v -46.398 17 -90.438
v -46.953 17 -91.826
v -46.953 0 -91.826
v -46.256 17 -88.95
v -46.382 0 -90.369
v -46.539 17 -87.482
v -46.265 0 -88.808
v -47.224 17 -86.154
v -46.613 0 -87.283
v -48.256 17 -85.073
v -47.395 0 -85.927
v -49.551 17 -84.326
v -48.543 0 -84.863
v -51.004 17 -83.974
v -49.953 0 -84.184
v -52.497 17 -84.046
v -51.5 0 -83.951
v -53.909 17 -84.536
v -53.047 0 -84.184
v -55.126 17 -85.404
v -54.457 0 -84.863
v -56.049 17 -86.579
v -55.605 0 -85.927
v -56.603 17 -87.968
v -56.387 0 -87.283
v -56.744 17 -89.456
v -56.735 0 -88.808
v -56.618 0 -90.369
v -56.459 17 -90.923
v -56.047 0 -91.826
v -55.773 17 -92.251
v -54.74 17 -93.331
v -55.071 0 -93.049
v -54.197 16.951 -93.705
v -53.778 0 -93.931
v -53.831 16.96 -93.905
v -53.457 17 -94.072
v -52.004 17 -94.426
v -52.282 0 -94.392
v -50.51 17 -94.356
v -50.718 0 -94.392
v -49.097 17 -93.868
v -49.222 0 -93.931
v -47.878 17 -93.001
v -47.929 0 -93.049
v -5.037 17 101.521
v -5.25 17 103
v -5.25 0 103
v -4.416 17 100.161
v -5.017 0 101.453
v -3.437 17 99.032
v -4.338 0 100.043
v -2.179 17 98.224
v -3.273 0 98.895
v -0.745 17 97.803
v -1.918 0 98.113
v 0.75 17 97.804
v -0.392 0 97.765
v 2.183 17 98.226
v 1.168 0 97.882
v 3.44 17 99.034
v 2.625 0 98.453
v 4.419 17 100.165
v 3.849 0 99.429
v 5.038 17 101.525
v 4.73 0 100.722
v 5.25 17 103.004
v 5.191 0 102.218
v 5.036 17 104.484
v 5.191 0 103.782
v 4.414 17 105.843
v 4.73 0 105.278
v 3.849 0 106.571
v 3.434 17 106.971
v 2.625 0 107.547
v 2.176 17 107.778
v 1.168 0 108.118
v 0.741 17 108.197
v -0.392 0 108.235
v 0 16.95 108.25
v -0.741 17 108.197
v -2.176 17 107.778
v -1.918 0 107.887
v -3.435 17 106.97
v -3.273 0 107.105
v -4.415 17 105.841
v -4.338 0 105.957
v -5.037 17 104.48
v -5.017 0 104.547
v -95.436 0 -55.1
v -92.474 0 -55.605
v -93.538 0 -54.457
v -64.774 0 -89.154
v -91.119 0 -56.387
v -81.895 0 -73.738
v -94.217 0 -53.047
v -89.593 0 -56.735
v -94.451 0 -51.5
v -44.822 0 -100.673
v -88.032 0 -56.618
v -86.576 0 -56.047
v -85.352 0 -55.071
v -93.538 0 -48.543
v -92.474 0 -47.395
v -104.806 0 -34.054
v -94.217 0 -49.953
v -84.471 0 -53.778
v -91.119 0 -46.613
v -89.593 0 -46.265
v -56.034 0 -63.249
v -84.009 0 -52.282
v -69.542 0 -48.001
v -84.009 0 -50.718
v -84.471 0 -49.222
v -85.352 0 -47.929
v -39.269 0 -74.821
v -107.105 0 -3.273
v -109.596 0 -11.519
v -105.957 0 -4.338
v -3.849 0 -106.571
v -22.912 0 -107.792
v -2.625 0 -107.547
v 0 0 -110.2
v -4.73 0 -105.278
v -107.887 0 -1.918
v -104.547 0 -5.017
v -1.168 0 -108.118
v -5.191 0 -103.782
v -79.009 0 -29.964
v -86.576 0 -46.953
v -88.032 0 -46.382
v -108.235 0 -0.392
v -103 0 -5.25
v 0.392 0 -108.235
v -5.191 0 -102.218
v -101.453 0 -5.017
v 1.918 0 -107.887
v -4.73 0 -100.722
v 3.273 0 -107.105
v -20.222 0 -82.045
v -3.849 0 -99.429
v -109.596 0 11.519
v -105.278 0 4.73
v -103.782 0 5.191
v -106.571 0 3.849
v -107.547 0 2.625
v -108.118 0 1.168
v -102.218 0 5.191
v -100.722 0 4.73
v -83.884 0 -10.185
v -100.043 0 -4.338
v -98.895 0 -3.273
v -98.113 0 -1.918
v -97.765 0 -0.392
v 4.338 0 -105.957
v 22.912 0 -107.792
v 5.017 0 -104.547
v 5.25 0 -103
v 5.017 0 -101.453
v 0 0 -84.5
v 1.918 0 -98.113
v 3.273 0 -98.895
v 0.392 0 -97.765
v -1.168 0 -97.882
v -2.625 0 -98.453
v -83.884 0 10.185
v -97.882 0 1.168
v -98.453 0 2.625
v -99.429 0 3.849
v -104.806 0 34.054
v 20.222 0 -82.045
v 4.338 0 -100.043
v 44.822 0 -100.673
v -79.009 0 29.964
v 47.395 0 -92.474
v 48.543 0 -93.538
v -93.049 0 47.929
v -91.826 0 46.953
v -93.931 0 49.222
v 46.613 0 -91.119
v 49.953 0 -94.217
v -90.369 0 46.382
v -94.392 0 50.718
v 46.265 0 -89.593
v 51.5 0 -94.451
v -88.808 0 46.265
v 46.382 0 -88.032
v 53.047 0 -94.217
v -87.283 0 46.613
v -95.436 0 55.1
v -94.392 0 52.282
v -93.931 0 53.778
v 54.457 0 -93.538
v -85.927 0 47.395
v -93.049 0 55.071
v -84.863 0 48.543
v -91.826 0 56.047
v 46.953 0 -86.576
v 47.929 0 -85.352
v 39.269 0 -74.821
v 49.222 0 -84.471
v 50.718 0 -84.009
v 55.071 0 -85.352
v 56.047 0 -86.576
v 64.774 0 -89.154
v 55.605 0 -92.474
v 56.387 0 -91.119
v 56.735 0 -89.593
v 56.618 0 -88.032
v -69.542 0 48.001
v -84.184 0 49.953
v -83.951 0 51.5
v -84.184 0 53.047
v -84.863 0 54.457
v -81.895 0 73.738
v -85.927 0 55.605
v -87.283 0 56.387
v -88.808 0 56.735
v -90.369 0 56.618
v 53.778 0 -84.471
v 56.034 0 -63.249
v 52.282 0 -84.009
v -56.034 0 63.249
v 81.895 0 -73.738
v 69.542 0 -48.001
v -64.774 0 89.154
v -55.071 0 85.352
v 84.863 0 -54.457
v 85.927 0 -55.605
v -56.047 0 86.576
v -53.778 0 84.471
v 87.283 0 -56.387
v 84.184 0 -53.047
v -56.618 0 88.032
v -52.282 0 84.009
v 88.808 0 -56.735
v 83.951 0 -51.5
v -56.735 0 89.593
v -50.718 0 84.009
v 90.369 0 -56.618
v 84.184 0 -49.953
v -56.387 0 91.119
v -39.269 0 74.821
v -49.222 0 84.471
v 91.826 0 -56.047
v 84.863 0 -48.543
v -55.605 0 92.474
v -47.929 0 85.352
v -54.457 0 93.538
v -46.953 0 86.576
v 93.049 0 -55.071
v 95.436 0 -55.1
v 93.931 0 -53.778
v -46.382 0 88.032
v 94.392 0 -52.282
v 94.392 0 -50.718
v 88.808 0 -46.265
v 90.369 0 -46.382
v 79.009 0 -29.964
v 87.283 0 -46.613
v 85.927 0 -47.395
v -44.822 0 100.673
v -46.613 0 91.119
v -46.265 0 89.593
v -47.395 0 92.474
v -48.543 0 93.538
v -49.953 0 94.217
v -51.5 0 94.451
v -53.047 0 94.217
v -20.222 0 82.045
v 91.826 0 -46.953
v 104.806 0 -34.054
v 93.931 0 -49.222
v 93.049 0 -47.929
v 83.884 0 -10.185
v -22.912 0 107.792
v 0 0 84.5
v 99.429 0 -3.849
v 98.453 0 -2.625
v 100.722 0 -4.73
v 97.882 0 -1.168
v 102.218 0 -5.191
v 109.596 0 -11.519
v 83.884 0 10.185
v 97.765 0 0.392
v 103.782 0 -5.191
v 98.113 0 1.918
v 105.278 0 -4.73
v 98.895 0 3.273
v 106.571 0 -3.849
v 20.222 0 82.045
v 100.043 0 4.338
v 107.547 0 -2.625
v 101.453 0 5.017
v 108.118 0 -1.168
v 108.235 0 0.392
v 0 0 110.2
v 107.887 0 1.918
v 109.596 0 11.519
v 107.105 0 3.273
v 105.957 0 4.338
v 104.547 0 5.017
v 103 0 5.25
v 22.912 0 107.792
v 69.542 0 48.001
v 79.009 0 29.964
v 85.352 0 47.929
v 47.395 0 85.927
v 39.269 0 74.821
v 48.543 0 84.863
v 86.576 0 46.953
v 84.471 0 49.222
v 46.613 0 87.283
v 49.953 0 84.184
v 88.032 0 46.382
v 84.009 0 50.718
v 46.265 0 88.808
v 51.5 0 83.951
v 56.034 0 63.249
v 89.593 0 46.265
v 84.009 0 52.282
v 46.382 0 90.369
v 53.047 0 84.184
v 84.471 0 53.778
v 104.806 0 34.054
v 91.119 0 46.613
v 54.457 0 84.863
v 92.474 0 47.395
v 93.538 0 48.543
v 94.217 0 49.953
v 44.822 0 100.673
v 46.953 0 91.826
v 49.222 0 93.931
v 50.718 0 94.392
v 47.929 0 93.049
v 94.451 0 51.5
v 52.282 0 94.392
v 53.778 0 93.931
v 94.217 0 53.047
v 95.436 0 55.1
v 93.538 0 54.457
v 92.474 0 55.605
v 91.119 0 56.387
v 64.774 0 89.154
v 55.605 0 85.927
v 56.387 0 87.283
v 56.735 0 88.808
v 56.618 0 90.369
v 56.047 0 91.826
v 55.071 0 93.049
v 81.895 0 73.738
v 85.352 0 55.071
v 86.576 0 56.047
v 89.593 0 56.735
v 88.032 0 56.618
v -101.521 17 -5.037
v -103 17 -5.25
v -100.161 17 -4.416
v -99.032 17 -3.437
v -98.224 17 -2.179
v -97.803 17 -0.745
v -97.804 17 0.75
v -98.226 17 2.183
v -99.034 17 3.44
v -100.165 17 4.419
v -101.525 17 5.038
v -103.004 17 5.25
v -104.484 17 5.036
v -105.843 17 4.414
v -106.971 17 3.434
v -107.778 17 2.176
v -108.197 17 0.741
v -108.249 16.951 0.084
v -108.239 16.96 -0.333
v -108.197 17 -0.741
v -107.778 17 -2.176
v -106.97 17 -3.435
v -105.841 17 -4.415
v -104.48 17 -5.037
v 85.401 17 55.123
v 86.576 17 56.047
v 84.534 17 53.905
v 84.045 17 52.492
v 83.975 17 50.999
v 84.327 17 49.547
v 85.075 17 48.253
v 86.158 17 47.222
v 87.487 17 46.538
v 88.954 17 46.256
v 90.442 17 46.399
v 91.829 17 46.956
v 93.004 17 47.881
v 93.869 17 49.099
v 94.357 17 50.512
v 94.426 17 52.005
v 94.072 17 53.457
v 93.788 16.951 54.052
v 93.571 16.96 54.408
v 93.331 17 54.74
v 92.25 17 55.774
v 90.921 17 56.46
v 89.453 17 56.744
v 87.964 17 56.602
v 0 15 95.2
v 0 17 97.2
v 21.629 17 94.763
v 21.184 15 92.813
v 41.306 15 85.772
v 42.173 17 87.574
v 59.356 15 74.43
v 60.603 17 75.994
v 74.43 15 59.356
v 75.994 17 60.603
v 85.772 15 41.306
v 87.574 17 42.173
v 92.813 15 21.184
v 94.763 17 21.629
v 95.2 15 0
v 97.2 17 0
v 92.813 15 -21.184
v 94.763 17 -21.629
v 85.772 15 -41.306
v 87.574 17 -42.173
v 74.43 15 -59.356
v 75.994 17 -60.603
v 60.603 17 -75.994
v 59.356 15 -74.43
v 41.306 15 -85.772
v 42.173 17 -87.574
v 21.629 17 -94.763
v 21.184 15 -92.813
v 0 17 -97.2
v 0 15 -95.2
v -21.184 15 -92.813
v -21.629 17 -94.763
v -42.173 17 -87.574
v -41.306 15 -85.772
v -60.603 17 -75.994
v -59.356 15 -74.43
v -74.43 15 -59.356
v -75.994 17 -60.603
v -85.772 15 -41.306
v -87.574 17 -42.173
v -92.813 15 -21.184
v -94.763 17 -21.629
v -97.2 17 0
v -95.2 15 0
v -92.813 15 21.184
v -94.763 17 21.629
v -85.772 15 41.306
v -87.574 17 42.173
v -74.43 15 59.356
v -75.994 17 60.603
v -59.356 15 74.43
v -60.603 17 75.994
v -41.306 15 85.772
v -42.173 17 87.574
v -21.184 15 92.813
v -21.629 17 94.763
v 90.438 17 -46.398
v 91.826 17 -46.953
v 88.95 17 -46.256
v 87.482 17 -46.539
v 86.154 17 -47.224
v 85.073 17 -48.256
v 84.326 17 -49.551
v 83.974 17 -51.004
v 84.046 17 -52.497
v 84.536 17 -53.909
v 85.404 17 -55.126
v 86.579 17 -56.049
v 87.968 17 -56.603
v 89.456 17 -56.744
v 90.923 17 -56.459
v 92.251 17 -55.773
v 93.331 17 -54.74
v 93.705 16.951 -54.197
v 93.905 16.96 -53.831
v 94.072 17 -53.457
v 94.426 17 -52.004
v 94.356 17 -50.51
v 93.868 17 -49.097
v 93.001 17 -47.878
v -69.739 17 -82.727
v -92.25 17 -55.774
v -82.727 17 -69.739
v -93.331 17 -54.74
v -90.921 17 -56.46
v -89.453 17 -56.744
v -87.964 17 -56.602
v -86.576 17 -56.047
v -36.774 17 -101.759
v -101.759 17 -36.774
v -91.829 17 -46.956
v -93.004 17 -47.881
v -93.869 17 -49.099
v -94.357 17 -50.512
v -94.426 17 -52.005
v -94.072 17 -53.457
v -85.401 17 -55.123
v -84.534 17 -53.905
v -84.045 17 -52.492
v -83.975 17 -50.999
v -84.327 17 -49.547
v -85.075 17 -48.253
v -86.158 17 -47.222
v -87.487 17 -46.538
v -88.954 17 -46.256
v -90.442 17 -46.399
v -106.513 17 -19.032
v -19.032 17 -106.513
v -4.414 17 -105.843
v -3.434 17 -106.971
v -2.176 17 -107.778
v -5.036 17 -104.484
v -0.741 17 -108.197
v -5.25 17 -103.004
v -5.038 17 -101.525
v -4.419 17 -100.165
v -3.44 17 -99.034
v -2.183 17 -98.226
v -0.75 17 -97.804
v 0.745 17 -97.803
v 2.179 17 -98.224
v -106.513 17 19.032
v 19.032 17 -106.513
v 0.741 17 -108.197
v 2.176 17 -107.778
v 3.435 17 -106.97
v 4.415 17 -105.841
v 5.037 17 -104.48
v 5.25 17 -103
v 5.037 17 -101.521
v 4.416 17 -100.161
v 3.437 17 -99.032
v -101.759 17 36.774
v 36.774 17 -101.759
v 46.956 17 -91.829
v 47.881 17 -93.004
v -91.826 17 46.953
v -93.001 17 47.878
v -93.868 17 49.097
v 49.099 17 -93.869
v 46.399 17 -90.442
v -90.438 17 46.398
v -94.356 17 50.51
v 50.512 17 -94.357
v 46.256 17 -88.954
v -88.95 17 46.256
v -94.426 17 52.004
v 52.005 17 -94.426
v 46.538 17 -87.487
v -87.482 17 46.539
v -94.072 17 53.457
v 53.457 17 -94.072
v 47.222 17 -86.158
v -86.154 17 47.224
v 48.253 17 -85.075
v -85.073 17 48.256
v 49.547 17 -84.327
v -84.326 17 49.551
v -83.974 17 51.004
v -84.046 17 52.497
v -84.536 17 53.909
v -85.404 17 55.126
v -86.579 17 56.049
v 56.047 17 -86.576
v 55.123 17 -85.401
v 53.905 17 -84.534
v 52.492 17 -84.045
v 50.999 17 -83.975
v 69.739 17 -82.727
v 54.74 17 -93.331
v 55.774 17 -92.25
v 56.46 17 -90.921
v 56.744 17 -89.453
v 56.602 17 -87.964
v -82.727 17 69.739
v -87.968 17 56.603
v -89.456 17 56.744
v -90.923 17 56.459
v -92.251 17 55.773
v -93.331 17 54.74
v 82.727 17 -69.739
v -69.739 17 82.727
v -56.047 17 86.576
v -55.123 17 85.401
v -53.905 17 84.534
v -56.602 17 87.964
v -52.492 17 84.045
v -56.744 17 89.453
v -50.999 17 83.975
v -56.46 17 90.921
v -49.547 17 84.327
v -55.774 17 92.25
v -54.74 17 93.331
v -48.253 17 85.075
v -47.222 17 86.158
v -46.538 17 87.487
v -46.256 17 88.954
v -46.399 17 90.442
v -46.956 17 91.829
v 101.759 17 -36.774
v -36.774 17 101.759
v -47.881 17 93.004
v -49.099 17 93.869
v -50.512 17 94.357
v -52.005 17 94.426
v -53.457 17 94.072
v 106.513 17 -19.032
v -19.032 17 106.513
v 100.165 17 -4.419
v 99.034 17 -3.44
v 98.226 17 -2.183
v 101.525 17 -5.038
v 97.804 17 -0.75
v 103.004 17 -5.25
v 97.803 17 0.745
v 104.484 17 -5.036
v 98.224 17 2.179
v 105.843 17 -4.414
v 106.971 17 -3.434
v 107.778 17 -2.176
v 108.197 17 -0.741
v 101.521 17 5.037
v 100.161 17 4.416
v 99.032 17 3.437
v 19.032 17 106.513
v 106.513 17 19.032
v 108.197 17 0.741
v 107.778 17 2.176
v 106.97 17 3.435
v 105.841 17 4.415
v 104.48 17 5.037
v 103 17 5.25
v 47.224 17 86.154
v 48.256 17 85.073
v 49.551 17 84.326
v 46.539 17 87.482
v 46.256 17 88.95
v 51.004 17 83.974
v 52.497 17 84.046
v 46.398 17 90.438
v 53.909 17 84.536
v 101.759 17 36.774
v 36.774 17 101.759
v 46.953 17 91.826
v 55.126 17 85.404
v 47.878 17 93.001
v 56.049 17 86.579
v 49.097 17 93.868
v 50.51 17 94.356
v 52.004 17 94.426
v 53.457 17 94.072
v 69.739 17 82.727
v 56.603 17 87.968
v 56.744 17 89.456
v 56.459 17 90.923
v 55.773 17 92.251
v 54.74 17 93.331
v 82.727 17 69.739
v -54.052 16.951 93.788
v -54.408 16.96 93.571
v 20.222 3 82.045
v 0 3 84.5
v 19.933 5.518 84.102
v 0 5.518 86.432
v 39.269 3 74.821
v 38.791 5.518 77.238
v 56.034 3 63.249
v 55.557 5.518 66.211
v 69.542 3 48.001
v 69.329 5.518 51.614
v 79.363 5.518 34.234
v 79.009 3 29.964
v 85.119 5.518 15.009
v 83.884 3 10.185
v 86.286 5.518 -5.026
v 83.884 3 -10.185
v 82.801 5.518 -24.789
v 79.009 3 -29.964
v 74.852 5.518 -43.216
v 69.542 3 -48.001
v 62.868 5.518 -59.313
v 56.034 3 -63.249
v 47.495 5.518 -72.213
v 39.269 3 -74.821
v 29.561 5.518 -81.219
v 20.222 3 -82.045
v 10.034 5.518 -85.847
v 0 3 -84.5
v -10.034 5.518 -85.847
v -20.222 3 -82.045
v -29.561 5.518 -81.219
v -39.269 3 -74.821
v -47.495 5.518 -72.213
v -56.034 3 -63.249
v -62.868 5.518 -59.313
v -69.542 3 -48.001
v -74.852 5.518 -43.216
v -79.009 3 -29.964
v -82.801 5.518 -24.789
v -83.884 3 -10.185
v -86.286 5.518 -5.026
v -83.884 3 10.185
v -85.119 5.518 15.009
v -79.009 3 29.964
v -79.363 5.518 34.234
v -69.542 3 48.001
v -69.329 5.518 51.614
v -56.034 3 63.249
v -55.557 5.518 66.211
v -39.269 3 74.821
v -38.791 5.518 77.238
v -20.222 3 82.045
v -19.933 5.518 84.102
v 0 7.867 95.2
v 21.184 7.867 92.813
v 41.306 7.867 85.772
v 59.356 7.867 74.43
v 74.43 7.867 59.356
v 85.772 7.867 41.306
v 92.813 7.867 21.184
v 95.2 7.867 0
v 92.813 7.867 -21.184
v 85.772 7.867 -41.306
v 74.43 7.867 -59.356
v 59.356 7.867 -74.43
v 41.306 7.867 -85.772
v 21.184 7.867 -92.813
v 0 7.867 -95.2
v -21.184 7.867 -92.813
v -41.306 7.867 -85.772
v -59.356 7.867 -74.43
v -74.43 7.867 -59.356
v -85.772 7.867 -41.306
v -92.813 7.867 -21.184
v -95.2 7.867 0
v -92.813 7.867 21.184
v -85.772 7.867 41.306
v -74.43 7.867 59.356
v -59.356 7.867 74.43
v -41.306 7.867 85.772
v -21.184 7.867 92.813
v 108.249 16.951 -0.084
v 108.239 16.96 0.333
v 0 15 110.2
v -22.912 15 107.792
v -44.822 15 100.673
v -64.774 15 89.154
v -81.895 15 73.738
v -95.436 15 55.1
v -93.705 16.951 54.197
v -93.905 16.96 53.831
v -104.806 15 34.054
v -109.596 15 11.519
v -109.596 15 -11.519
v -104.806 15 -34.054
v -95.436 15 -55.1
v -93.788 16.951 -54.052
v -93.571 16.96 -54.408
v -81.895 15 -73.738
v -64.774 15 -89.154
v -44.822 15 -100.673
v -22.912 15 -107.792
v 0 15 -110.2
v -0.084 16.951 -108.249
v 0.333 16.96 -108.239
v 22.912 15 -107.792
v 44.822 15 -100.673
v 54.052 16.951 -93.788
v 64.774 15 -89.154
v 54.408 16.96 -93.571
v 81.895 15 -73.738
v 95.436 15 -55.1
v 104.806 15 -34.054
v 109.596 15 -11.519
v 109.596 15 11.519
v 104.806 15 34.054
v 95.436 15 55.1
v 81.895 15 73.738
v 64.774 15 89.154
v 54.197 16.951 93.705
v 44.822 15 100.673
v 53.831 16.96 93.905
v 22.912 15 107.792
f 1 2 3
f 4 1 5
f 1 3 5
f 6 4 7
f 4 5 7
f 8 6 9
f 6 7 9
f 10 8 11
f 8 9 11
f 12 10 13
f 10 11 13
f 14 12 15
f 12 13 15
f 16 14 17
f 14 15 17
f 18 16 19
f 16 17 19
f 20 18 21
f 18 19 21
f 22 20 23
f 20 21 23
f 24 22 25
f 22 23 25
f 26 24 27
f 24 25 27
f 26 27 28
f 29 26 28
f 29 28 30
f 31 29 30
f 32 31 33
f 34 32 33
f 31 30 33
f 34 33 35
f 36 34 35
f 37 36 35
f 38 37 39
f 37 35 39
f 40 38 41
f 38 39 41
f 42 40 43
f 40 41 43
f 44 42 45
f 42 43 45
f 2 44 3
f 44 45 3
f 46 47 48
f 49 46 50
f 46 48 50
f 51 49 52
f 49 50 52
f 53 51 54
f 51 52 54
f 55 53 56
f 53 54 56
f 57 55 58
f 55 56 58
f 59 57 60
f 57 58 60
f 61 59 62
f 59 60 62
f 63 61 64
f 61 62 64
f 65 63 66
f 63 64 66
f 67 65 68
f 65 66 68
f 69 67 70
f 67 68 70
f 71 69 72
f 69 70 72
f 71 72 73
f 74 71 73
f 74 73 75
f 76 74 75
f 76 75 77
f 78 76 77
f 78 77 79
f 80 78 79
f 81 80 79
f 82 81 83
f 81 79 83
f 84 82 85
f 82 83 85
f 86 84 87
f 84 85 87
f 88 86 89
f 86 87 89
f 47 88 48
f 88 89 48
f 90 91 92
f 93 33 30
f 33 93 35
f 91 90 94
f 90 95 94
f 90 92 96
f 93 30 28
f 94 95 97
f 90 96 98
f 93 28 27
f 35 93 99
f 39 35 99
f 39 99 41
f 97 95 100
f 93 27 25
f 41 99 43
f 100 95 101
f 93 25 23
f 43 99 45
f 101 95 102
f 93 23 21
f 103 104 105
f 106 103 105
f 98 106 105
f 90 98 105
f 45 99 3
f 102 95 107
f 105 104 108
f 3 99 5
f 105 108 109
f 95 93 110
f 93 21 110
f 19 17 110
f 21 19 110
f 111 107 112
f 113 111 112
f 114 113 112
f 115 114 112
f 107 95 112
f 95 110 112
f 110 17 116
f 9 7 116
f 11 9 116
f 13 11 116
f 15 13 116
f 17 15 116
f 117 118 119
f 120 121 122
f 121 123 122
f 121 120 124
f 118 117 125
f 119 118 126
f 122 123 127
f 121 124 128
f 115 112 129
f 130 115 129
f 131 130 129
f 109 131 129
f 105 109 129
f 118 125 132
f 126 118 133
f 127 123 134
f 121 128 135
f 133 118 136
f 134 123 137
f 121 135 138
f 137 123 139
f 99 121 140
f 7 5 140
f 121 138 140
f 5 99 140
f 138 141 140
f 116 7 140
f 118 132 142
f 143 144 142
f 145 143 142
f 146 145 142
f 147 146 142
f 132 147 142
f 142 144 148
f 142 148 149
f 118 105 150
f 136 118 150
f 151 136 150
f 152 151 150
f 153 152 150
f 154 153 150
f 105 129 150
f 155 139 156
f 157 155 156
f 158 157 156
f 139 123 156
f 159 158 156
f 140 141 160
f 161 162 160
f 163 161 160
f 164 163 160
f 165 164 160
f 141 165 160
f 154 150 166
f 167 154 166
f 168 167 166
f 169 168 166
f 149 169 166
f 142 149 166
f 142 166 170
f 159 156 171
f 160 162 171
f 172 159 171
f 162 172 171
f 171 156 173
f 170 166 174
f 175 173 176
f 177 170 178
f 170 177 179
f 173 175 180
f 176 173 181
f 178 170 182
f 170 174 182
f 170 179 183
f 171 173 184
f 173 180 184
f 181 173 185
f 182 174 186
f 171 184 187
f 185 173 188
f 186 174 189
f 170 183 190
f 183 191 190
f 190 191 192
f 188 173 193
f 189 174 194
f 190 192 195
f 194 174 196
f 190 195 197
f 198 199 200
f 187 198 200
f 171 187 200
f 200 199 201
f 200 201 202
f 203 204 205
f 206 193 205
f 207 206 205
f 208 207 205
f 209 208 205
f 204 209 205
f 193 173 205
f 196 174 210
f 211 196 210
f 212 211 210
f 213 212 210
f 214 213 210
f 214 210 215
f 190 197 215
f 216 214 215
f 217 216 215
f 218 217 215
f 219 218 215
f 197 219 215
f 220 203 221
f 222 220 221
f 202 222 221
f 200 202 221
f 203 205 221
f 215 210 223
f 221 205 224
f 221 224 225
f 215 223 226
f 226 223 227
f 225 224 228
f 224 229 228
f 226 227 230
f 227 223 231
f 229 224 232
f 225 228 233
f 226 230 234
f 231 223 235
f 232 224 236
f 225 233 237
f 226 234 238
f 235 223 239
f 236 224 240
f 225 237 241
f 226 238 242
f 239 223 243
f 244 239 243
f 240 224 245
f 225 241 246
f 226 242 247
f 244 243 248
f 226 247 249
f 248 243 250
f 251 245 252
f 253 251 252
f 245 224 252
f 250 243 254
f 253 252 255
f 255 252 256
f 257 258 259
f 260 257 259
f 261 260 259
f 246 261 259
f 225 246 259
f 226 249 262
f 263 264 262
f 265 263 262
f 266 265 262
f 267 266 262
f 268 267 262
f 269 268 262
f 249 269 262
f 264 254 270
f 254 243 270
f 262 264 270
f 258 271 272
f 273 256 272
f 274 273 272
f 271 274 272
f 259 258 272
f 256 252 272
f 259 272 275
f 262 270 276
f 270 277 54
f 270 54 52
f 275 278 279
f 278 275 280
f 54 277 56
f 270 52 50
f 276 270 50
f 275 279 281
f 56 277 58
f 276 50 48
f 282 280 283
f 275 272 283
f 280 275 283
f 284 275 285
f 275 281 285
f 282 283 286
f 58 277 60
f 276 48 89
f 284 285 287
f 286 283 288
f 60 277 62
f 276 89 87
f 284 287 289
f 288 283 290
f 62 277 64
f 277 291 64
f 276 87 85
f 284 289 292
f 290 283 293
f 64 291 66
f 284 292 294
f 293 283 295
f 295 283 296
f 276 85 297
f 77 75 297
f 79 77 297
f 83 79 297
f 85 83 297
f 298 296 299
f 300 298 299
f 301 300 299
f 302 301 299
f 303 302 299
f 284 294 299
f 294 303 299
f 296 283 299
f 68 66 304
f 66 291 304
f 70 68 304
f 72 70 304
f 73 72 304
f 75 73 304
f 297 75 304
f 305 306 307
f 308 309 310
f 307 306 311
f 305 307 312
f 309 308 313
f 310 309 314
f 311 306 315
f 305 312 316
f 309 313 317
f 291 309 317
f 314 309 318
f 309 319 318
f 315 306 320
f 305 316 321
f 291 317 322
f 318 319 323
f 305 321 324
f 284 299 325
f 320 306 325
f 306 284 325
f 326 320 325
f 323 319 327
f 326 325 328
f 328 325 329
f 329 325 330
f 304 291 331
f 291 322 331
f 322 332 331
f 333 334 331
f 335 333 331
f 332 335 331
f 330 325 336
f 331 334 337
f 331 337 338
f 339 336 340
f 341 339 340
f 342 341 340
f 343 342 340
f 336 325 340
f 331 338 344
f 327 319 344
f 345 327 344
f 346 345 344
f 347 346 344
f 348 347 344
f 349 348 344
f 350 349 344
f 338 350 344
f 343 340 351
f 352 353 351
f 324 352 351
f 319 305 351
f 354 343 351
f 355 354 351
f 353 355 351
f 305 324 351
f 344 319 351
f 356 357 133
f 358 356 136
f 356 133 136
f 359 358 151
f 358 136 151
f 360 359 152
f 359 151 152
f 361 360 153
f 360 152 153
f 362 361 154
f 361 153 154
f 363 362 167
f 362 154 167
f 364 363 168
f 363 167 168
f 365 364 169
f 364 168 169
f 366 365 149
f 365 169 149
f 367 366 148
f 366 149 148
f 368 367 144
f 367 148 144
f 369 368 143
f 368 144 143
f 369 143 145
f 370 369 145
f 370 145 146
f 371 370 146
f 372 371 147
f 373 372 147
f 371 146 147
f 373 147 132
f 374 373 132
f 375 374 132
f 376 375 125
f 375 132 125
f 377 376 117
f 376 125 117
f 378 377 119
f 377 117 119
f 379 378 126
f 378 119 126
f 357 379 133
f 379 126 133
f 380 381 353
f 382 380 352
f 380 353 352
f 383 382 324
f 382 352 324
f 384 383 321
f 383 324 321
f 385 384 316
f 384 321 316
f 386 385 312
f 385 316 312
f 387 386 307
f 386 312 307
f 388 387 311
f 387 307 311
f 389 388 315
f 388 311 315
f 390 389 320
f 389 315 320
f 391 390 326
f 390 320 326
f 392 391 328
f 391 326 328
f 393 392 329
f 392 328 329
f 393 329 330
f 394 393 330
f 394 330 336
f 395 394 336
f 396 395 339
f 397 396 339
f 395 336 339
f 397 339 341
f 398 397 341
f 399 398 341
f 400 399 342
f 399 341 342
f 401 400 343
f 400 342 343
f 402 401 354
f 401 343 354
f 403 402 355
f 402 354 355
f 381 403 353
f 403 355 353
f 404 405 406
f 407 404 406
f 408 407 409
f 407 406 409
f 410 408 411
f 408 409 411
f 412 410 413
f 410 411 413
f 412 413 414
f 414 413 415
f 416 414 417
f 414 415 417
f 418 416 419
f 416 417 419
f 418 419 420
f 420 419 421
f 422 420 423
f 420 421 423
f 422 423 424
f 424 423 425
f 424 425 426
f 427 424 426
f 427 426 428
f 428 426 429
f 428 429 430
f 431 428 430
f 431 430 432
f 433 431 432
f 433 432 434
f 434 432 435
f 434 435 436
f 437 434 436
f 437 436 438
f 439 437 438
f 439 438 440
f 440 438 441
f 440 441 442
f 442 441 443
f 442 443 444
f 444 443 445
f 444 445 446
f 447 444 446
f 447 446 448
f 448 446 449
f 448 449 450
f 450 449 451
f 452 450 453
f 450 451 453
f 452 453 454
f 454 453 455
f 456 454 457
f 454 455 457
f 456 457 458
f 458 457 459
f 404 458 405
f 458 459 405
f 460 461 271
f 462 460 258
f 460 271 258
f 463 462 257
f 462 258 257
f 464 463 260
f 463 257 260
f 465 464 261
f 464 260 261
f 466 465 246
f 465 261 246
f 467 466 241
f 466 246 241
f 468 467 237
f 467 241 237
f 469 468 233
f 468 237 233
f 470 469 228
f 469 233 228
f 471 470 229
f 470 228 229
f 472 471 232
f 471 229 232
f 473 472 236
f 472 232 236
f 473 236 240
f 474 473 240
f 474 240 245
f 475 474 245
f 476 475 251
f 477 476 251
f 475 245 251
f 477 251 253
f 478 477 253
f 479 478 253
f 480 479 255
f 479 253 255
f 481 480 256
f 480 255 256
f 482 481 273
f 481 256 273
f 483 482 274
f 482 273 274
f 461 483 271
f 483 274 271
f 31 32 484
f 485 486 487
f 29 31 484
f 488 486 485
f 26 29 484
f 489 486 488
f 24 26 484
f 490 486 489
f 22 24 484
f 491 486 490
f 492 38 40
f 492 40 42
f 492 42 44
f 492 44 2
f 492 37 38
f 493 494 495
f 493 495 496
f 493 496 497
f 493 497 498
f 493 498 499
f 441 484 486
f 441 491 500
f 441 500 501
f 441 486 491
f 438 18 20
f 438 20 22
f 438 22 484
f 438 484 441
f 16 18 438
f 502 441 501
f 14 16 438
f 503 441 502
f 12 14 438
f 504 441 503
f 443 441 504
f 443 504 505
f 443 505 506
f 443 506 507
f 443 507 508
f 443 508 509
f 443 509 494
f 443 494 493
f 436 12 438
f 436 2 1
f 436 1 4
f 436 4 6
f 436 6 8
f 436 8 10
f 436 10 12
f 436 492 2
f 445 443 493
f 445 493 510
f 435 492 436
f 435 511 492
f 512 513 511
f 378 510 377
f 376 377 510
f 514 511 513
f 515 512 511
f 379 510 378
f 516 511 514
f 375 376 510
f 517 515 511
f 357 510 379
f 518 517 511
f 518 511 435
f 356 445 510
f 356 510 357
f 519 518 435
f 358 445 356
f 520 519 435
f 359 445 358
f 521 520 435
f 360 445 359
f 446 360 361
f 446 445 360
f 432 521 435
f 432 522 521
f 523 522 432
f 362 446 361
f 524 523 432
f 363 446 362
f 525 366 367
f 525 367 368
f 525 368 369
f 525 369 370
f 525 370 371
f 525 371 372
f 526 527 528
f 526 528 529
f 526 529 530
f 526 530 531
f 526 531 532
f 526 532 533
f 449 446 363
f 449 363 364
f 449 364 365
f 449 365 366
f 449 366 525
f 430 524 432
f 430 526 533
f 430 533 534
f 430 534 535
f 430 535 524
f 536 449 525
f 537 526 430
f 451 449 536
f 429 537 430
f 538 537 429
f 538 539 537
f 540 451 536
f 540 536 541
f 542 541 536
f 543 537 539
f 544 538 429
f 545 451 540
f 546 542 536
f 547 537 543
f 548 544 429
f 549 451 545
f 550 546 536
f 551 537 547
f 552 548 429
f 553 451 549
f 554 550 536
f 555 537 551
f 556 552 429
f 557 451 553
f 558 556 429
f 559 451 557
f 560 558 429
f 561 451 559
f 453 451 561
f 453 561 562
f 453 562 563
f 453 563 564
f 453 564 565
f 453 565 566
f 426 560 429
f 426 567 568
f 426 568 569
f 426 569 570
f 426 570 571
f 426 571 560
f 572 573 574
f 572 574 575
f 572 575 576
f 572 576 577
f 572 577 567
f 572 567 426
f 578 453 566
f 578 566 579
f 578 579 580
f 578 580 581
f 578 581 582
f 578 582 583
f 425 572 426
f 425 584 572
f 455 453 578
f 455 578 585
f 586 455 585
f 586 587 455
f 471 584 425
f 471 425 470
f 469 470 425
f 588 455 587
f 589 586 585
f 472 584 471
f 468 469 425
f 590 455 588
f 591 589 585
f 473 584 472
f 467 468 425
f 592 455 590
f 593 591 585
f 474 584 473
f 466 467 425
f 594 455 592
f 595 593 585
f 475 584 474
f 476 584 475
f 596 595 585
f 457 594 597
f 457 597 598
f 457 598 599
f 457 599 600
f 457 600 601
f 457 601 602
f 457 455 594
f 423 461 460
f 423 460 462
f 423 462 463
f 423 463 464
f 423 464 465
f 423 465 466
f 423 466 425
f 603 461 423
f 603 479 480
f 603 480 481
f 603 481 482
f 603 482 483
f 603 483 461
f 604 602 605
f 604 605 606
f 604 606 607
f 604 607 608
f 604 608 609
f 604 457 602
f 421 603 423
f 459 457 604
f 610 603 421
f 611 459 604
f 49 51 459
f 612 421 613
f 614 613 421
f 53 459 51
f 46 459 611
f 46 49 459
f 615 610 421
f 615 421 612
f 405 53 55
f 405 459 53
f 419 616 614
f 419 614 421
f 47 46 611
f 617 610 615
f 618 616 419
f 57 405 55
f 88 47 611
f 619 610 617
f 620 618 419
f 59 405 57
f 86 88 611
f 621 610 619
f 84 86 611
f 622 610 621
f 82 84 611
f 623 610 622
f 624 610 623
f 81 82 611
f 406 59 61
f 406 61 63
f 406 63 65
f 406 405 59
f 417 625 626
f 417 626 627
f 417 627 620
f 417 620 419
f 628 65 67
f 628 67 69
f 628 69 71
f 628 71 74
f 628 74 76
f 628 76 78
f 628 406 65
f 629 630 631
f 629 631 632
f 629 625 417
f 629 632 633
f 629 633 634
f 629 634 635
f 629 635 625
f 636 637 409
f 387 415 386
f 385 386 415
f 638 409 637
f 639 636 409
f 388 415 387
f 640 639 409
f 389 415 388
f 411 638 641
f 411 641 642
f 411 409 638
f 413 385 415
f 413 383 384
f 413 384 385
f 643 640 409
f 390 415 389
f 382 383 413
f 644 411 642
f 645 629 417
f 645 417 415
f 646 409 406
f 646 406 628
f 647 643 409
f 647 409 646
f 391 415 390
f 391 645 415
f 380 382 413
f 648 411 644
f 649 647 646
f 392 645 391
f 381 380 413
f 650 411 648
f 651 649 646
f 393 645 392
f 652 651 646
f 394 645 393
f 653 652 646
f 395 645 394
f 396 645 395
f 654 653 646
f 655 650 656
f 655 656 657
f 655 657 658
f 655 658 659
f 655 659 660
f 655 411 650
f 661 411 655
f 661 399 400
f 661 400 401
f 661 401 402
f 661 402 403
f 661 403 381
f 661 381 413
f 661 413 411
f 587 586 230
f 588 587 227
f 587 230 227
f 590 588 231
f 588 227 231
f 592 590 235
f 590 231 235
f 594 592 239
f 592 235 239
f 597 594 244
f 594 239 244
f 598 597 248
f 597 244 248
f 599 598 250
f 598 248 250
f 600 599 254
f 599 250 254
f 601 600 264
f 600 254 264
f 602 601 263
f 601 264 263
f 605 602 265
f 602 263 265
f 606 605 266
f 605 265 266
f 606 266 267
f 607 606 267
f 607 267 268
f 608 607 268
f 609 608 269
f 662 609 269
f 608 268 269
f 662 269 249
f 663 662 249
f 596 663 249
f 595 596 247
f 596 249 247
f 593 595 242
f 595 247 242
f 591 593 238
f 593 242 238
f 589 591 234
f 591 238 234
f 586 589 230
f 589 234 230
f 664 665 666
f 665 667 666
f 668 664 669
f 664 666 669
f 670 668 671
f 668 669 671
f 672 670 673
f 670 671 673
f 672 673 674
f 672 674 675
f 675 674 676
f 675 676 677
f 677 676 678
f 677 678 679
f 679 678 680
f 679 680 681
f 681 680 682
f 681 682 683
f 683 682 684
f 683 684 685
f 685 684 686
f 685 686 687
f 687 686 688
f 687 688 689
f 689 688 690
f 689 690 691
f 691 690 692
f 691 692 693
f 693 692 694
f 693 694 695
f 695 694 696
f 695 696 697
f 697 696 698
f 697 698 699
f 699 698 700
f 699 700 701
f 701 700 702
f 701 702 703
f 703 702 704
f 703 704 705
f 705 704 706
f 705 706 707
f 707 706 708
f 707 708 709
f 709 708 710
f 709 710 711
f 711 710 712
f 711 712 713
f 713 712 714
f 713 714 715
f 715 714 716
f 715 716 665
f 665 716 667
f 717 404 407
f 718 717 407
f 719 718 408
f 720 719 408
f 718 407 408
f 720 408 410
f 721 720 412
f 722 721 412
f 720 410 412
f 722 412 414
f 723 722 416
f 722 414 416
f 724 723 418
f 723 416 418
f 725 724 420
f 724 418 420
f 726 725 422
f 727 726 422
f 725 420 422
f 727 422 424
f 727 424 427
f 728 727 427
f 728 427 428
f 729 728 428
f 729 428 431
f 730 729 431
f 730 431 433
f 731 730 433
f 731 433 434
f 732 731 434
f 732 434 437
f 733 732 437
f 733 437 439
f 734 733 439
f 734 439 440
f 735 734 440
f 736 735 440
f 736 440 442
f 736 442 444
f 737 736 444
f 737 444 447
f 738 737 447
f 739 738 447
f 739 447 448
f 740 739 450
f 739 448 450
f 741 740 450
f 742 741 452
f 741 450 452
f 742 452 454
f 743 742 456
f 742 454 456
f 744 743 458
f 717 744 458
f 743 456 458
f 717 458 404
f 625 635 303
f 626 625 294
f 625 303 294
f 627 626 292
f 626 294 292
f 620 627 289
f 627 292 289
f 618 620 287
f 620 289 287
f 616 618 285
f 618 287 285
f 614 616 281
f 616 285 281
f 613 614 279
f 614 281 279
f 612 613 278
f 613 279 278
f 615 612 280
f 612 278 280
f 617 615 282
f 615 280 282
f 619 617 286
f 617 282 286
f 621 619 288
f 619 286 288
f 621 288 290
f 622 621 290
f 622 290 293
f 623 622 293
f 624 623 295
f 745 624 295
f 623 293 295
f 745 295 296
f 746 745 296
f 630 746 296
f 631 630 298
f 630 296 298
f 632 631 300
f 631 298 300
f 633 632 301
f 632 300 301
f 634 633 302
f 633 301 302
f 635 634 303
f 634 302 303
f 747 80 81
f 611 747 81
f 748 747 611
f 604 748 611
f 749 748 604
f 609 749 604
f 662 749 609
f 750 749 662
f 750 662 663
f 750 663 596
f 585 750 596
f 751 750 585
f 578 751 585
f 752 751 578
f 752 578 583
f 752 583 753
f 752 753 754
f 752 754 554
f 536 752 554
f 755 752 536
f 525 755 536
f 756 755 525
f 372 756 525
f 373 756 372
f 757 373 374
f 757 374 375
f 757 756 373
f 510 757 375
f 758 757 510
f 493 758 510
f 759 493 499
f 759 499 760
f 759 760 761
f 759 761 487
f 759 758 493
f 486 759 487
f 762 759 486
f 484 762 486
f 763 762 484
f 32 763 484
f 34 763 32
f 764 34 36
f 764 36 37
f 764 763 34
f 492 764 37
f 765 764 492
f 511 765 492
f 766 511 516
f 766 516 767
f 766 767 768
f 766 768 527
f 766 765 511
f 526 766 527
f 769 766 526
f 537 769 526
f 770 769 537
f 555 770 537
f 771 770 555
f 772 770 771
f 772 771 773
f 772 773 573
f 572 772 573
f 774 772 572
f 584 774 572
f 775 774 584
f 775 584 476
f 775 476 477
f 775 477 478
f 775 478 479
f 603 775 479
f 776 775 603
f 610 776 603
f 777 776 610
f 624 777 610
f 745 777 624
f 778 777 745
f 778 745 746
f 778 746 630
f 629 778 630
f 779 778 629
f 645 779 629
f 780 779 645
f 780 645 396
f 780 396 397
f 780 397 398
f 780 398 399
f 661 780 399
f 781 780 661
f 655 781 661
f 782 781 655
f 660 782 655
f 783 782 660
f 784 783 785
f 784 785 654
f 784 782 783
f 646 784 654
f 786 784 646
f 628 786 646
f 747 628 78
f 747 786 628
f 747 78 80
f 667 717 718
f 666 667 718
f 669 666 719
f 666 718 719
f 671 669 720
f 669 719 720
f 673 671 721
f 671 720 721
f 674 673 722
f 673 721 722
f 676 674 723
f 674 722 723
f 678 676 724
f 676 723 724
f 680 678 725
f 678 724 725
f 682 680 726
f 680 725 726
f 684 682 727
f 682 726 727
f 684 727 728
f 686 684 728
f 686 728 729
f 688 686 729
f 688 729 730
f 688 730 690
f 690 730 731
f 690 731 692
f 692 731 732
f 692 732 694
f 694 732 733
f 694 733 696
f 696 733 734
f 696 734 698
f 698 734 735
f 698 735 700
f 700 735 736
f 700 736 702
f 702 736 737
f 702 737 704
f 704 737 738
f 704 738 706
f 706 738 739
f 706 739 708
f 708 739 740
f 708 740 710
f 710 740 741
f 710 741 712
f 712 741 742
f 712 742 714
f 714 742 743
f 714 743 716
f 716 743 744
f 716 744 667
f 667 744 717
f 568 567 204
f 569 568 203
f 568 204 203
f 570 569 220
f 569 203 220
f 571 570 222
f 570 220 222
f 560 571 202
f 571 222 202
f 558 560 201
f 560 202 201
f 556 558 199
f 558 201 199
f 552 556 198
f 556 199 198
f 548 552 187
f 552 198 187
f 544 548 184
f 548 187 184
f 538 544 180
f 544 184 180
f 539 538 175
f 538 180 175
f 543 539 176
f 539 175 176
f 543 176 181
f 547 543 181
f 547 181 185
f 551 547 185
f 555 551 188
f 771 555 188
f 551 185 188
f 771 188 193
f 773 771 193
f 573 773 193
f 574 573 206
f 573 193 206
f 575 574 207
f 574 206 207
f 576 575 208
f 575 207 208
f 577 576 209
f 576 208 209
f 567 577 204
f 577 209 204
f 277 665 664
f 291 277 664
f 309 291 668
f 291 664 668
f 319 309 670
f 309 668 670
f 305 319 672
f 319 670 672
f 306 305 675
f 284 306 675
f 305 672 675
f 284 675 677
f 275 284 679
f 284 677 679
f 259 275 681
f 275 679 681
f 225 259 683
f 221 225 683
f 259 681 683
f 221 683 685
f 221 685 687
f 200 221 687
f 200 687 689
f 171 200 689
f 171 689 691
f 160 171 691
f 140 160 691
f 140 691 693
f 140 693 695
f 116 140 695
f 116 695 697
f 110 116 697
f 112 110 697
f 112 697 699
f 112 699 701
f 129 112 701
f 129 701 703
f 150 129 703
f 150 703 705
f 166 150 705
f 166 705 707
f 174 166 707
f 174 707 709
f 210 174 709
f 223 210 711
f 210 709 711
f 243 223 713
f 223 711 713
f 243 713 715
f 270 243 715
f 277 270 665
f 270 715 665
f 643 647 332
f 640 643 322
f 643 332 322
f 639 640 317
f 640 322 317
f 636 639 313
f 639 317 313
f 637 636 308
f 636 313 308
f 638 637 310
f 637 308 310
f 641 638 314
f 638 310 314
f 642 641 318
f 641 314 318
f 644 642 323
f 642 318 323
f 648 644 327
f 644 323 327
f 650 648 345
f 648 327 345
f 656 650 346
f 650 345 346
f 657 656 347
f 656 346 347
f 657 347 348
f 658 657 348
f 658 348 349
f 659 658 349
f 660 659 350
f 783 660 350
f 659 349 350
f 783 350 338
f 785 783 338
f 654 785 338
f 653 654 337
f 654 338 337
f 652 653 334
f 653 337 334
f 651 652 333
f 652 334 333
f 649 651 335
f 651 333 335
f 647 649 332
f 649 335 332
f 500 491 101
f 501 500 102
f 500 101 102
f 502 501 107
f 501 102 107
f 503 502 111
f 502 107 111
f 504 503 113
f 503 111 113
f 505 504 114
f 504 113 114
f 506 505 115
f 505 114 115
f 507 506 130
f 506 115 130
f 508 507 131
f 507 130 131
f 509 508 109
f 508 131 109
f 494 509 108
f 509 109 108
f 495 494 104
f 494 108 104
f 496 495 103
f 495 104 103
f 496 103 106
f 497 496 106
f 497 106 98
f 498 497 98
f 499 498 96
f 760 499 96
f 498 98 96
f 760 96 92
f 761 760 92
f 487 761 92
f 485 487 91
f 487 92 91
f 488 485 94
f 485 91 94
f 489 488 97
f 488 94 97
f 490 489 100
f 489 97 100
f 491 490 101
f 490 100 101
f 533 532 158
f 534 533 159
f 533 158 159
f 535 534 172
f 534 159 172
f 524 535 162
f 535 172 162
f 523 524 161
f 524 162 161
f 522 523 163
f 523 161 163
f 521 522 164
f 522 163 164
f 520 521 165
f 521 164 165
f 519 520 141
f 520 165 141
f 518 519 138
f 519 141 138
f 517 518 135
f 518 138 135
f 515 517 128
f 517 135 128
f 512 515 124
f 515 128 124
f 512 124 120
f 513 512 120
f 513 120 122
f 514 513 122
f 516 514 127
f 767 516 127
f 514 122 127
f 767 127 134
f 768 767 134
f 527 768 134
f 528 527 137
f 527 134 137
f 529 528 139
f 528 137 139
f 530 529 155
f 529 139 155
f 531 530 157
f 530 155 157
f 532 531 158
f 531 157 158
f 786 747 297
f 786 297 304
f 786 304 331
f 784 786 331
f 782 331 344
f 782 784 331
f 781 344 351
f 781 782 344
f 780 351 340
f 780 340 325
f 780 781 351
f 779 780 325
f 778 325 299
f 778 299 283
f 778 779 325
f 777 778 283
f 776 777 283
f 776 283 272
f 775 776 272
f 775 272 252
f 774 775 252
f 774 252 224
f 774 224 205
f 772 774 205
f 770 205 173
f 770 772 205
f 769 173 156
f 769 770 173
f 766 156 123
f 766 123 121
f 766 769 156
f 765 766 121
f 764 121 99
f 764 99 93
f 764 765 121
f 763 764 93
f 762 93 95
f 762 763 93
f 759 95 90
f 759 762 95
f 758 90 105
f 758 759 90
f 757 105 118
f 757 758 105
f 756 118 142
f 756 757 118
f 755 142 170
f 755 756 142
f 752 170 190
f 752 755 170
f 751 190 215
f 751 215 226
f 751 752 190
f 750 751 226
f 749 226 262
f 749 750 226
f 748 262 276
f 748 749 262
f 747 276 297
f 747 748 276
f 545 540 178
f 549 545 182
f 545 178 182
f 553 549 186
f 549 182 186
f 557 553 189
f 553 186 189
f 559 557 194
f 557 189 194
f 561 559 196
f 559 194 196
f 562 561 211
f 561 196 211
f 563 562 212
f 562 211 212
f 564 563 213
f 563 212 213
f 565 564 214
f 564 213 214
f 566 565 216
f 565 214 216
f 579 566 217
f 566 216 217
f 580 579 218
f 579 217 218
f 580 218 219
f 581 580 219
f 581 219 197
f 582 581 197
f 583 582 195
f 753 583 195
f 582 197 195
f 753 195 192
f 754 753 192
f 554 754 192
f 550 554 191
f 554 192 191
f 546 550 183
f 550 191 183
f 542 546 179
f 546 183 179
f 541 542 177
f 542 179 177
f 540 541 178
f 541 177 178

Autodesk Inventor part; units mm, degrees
ref_plane "YZ Plane" through (0, 0, 0) normal (1, 0, 0) x (0, 1, 0)
ref_plane "XZ Plane" through (0, 0, 0) normal (0, 1, 0) x (-1, 0, 0)
ref_plane "XY Plane" through (0, 0, 0) normal (0, 0, 1) x (1, 0, 0)
sketch "Sketch1" plane through (0, 0, 0) normal (1, 0, 0) x (0, 1, 0)
  line L0 (0, 84.5) -> (5, 84.5)
  line L1 (5, 84.5) -> (7.8671, 95.2)
  line L2 (7.8671, 95.2) -> (17, 95.2)
  line L3 (5, 84.5) -> (5, 129.2846) construction
  line L4 (0, 84.5) -> (0, 110.2)
  line L5 (0, 110.2) -> (17, 110.2)
  line L6 (17, 110.2) -> (17, 95.2)
  line L7 (-3.4, 0) -> (20.4, 0) projected
  point P0 (0, 0)
  dimension "d0" = 15
  dimension "d1" = 95.2
  dimension "d3" = 84.5
  dimension "d4" = 5
  dimension "d5" = 12
  dimension "d7" = 15
revolve "Revolution1" add sketch "Sketch1" angle 360 about axis through (0, -10, 0) along (0, 1, 0)
sketch "Sketch2" plane through (0, 0, 0) normal (0, -1, 0) x (1, 0, 0)
  circle A0 centre (0, 0) radius 95.2 construction
  circle A1 centre (0, 0) radius 110.2 construction
  circle A2 centre (0, -103) radius 5.25
  dimension "d9" = 10.5
  dimension "d10" = 103
extrude "Extrusion1" cut sketch "Sketch2" against normal through all
pattern_circular "Circular Pattern1" count 12 over 360 about axis through (0, -10, 0) along (0, 1, 0) of "Extrusion1"
chamfer "Chamfer1" distance 2 angle 45 3 edges at (0, 5, -84.5) (0, 17, -95.2) (0, 17, -110.2)
properties part number "KF160_adaptor"
